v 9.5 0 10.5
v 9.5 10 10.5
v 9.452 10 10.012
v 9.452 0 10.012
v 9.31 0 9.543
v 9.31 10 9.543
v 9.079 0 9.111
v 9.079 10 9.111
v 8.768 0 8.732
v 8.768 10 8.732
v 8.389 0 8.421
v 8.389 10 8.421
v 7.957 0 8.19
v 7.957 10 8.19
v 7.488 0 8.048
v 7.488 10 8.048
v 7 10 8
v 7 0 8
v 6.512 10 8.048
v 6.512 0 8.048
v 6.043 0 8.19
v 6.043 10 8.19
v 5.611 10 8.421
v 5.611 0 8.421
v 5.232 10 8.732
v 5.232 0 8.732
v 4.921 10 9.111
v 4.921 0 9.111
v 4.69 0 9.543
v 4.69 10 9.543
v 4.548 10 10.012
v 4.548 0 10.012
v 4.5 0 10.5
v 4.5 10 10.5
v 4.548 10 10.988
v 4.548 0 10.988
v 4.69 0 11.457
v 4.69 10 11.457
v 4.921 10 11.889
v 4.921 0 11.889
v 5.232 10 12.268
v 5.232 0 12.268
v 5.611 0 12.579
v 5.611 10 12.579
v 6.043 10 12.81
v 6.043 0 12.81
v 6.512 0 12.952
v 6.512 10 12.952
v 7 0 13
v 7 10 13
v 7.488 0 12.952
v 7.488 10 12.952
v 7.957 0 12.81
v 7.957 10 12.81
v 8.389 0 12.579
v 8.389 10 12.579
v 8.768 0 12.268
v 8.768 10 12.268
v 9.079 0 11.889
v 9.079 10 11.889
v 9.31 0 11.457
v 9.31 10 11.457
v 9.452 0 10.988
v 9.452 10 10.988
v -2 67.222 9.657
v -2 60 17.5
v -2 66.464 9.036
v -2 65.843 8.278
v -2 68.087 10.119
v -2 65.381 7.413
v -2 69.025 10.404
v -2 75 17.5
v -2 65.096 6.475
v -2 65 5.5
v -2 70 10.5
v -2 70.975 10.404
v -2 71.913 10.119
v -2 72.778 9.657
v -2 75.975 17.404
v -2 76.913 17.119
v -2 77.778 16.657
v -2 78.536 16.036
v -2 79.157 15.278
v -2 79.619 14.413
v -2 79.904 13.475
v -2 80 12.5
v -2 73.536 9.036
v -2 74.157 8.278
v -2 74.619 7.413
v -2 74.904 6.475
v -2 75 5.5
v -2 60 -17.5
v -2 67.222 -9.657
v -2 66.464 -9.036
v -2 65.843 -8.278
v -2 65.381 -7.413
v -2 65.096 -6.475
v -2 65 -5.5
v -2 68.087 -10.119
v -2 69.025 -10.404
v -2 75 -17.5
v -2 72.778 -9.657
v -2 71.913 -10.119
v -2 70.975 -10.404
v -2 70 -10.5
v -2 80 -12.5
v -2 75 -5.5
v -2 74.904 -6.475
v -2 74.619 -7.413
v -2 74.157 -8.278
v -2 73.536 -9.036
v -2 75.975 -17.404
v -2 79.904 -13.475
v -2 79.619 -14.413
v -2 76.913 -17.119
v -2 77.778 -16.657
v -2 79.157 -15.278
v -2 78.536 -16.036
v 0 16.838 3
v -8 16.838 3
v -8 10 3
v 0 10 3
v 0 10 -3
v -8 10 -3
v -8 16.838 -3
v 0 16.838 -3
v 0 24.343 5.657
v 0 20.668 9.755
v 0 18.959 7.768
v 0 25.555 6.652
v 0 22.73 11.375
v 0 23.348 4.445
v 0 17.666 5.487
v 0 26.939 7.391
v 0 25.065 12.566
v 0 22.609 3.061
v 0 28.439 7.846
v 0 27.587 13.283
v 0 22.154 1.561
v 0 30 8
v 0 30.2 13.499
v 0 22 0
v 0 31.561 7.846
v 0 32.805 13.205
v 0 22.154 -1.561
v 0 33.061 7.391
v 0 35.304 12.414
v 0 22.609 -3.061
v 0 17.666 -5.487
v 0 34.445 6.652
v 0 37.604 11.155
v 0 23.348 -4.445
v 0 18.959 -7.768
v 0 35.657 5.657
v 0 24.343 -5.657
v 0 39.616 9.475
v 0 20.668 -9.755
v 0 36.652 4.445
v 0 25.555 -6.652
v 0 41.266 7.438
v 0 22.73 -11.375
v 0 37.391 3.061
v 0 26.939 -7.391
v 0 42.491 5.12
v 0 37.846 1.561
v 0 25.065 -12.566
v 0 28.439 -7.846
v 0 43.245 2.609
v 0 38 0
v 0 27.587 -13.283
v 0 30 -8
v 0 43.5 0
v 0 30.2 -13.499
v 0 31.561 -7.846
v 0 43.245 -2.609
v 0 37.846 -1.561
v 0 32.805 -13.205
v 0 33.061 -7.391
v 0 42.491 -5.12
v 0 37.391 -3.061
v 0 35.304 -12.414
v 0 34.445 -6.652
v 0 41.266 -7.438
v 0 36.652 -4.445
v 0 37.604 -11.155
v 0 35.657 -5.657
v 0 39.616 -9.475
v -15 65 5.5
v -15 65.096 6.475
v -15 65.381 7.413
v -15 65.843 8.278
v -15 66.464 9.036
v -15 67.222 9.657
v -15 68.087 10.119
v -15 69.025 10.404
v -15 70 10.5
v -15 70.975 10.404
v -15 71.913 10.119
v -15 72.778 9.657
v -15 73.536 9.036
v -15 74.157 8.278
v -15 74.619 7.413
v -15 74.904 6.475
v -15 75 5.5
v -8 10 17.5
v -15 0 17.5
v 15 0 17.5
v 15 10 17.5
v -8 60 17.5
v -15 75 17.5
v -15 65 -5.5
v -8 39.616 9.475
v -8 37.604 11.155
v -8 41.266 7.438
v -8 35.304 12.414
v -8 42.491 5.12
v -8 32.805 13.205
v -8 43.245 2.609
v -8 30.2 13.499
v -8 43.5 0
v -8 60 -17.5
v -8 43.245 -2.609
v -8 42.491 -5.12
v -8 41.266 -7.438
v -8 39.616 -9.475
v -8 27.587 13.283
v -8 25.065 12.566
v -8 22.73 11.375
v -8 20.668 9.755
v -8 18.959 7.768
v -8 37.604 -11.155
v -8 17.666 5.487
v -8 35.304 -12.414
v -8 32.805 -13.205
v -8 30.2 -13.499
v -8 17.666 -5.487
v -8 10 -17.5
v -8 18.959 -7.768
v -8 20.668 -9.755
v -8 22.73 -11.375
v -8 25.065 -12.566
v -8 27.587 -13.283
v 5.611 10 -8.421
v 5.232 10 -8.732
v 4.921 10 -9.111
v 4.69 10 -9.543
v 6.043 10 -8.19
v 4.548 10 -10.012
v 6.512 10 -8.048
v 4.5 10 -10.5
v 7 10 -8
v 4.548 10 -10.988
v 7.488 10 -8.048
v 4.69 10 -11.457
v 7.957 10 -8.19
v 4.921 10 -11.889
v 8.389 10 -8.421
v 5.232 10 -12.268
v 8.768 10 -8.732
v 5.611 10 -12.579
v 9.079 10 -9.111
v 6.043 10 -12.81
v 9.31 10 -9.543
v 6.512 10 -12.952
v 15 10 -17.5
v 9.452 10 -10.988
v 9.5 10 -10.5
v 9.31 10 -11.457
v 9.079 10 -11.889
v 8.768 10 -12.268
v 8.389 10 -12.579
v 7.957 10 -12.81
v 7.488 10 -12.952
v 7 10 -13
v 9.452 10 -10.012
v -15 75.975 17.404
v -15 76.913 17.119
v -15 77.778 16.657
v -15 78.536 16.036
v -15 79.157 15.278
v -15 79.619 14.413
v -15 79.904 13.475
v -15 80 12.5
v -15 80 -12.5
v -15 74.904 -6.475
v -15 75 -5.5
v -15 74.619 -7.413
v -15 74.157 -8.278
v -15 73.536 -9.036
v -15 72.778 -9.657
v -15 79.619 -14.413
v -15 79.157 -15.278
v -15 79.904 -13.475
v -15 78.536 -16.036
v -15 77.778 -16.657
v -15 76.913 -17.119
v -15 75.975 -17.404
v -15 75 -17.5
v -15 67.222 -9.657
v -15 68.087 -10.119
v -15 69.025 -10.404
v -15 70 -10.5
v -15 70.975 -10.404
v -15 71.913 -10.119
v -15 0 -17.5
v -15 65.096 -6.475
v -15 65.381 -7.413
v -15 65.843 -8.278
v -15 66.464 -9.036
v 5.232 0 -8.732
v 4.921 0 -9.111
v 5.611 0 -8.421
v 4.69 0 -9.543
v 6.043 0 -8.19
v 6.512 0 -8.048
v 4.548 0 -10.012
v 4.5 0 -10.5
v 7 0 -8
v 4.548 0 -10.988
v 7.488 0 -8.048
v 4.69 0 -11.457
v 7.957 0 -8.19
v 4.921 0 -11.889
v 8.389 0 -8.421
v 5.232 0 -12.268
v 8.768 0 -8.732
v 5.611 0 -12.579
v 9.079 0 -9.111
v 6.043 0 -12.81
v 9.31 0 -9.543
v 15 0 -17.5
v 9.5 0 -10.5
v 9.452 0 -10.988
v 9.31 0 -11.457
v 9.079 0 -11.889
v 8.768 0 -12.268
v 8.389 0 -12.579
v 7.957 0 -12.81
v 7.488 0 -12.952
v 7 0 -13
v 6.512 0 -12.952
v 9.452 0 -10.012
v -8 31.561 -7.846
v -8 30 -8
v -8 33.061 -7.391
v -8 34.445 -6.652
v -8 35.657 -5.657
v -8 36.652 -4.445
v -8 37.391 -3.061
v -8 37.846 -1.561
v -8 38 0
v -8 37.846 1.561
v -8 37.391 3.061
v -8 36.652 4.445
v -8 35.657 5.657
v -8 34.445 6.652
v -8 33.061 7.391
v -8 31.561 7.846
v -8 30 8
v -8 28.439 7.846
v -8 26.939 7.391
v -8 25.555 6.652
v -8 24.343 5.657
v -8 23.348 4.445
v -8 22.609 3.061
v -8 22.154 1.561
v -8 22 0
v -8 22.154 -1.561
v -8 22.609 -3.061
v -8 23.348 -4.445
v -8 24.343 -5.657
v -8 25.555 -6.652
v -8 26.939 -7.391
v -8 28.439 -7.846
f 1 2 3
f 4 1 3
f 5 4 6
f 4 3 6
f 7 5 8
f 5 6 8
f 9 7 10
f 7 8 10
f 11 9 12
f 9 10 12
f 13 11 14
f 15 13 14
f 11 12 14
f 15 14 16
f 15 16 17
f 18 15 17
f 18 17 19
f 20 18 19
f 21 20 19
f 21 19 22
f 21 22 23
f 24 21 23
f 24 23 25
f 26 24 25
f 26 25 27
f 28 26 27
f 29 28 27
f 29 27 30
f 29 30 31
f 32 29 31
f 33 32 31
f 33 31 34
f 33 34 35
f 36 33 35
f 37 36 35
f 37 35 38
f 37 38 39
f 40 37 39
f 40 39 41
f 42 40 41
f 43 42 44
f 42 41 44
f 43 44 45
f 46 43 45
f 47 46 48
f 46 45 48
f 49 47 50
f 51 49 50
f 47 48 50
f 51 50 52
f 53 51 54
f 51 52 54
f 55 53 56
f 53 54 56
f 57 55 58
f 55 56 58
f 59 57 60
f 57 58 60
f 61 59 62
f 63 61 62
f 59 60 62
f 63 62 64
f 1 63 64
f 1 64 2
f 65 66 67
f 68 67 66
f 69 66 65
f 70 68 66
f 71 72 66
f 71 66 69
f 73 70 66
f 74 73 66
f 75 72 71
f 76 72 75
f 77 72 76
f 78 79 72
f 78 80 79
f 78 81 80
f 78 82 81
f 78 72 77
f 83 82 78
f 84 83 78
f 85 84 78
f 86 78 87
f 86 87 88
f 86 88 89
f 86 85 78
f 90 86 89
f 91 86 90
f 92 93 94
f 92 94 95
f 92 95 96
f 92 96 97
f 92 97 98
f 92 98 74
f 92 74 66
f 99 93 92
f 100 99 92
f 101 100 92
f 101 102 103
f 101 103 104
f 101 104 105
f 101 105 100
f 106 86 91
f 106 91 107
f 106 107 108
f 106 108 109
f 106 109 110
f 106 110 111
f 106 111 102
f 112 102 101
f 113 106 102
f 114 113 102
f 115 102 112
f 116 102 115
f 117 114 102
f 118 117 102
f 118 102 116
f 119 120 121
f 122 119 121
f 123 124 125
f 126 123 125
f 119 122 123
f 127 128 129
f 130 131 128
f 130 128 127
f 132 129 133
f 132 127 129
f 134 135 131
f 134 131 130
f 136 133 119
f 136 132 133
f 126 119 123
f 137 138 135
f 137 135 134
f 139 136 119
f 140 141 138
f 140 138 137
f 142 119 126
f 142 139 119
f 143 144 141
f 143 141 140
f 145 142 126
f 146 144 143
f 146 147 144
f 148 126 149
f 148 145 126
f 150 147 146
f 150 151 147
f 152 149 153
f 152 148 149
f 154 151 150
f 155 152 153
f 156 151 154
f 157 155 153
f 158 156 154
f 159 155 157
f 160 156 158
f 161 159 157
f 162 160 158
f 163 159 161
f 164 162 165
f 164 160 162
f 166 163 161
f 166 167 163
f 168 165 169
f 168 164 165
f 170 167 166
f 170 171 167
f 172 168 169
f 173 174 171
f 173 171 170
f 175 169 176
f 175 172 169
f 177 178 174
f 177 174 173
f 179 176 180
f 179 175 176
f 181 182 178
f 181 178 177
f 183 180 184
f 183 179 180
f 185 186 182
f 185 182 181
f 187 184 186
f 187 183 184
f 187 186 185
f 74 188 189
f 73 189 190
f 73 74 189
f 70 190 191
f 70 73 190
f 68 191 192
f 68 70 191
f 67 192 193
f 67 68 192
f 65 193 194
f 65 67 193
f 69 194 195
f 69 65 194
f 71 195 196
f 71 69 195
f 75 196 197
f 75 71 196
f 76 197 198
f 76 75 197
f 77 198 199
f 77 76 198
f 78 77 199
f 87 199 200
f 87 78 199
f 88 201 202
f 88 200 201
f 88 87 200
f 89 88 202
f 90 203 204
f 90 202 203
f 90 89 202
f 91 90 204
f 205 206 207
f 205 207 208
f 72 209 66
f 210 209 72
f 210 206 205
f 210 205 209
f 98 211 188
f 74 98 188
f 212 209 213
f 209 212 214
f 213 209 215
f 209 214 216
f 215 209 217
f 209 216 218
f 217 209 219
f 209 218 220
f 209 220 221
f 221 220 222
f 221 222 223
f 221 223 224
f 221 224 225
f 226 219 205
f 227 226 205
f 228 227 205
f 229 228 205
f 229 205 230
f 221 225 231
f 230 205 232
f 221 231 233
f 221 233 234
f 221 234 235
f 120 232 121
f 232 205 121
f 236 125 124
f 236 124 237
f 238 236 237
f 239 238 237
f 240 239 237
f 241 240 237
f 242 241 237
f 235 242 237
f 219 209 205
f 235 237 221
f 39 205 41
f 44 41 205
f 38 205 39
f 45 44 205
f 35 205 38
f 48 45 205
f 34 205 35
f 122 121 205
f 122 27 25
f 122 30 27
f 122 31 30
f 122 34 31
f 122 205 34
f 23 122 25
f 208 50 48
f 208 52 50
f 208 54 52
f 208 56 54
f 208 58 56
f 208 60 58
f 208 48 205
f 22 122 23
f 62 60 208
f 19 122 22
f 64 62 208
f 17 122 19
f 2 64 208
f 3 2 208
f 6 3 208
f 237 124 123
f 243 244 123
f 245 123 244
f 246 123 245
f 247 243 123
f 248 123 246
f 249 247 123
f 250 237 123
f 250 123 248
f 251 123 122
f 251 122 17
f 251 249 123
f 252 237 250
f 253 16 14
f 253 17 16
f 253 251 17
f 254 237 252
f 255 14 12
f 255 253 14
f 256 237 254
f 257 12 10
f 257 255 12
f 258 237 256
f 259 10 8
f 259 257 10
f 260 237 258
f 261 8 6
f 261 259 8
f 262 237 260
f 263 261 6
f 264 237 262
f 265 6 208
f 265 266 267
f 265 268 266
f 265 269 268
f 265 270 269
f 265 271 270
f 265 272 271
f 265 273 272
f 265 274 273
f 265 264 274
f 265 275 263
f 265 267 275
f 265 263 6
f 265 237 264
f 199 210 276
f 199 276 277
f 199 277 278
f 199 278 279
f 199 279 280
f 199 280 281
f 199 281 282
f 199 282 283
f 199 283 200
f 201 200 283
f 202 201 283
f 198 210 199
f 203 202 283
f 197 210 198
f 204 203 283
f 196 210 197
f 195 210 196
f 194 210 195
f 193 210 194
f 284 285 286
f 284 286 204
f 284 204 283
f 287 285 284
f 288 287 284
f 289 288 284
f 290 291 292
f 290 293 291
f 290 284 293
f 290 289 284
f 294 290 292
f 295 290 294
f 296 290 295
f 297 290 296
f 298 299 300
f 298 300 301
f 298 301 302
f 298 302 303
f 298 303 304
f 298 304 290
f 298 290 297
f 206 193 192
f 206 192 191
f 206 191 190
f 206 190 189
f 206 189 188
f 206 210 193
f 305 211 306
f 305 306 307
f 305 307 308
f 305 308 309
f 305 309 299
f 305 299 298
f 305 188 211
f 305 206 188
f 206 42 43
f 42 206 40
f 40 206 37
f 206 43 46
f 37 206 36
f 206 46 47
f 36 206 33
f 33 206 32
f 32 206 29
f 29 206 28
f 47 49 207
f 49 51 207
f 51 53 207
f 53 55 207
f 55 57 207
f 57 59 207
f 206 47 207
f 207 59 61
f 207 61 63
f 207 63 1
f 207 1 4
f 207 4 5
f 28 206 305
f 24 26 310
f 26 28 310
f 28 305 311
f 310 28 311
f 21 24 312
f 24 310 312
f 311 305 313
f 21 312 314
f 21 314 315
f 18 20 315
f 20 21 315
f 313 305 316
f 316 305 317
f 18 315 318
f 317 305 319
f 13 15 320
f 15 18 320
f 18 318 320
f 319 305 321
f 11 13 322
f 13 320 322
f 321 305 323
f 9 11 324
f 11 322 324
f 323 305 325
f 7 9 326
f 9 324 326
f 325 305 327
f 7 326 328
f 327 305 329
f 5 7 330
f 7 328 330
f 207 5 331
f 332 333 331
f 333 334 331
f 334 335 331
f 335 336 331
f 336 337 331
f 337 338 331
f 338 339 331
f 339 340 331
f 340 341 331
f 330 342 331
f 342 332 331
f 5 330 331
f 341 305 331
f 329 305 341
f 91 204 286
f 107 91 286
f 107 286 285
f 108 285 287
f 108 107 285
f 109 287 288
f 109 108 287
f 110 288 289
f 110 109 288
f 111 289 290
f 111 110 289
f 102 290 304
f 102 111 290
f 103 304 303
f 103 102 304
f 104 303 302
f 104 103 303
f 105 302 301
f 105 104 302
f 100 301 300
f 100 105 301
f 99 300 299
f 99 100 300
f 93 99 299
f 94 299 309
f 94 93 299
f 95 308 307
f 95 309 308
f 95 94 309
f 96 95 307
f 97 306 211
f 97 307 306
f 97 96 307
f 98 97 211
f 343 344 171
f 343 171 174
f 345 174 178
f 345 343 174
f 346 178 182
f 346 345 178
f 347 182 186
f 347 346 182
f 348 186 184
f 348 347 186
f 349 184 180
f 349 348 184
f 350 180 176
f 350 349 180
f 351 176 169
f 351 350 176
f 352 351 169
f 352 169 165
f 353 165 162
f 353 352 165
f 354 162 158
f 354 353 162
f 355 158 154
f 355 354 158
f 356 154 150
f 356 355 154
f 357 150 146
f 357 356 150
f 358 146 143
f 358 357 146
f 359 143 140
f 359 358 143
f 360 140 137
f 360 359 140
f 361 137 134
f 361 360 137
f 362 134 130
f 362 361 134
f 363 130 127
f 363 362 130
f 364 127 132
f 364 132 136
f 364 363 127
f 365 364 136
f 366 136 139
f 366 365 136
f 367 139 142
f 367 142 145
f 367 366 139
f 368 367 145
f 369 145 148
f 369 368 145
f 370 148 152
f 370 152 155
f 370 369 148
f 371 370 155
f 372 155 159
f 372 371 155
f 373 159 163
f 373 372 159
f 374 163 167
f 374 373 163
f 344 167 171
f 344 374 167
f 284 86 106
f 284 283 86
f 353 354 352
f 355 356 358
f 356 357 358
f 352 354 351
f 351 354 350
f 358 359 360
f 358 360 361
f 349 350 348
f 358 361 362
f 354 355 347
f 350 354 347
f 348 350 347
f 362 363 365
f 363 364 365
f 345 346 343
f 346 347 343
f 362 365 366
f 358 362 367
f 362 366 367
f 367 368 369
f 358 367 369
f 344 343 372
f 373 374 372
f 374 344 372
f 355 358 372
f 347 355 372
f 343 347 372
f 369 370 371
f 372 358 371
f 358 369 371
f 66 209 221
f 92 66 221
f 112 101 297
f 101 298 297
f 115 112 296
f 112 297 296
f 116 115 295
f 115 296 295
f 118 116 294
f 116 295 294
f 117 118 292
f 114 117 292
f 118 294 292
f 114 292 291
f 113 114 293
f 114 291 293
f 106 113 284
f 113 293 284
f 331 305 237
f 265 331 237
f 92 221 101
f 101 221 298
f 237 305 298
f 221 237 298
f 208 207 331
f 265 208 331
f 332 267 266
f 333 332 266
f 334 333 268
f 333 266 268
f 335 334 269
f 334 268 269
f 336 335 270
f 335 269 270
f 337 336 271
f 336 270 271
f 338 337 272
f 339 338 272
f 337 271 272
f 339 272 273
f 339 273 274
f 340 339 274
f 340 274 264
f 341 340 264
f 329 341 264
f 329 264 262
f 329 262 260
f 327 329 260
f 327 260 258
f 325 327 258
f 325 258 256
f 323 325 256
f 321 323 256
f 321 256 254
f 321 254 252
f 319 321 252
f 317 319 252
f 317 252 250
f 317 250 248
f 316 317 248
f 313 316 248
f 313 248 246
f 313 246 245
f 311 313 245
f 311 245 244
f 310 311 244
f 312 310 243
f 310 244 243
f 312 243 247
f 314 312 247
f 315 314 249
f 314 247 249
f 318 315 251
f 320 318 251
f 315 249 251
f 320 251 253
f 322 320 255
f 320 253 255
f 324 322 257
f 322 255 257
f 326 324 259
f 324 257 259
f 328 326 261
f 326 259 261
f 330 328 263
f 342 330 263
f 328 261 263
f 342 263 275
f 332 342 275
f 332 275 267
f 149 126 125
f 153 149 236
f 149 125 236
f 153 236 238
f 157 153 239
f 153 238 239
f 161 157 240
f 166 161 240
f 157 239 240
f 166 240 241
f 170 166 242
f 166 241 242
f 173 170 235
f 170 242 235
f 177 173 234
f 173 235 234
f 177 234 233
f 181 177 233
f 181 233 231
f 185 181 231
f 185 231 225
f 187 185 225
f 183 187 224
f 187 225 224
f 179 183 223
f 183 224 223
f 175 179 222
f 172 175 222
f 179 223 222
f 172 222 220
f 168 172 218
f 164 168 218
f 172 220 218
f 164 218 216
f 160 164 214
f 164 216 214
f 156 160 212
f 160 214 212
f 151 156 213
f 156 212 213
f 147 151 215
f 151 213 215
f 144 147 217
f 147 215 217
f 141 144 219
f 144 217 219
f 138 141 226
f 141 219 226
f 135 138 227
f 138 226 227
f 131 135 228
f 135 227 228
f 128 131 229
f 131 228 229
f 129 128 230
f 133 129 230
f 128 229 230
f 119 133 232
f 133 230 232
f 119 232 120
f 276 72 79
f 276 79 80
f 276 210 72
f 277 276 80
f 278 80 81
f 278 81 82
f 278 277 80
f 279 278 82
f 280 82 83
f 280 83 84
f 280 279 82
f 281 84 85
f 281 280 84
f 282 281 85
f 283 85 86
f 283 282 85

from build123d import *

# Parameters (mm, degrees)
IZIM1_W                     = 30
IZIM1_H                     = 35
Y_KSEKLIK_EKSTR_ZYON1_DEPTH = 10
IZIM2_W                     = 7
IZIM2_H                     = 35
Y_KSEKLIK_EKSTR_ZYON2_DEPTH = 70
IZIM3_W                     = 35
IZIM3_H                     = 20
Y_KSEKLIK_EKSTR_ZYON3_DEPTH = 6
RADYUS1_R                   = 5
KES_EKSTR_ZYON1_DEPTH       = 14
IZIM5_R                     = 2.5
KES_EKSTR_ZYON2_DEPTH       = 11
IZIM6_R                     = 8
Y_KSEKLIK_EKSTR_ZYON4_DEPTH = 8


with BuildPart() as part:
    # Çizim1 → Yükseklik-Ekstrüzyon1 (new body)
    with BuildSketch(Plane(origin=(0, 0, 0), x_dir=(1, 0, 0), z_dir=(0, 1, 0))):
        Rectangle(IZIM1_W, IZIM1_H)
    extrude(amount=Y_KSEKLIK_EKSTR_ZYON1_DEPTH)

    # Çizim2 → Yükseklik-Ekstrüzyon2 (add)
    with BuildSketch(Plane(origin=(0, 10, 0), x_dir=(1, 0, 0), z_dir=(0, 1, 0))):
        with Locations((-11.5, 0)):
            Rectangle(IZIM2_W, IZIM2_H)
    extrude(amount=Y_KSEKLIK_EKSTR_ZYON2_DEPTH)

    # Çizim3 → Yükseklik-Ekstrüzyon3 (add)
    with BuildSketch(Plane(origin=(-8, 0, 0), x_dir=(0, 0, -1), z_dir=(1, 0, 0))):
        with Locations((0, 70)):
            Rectangle(IZIM3_W, IZIM3_H)
    extrude(amount=Y_KSEKLIK_EKSTR_ZYON3_DEPTH)

    # Radyus1
    radyus1_edges = [part.edges().sort_by_distance(p)[0] for p in [
        (-8.5, 80, 17.5),
        (-8.5, 80, -17.5),
    ]]
    fillet(radyus1_edges, radius=RADYUS1_R)

    # Çizim4 → Kes-Ekstrüzyon1 (cut, through all)
    with BuildSketch(Plane(origin=(-2, 0, 0), x_dir=(0, 0, -1), z_dir=(1, 0, 0))):
        with BuildLine():
            Line((-5.5, 75), (5.5, 75))
            ThreePointArc((5.5, 75), (10.5, 70), (5.5, 65))
            Line((5.5, 65), (-5.5, 65))
            ThreePointArc((-5.5, 65), (-10.5, 70), (-5.5, 75))
        make_face()
    extrude(amount=-KES_EKSTR_ZYON1_DEPTH, mode=Mode.SUBTRACT)

    # Çizim5 → Kes-Ekstrüzyon2 (cut, through all)
    with BuildSketch(Plane(origin=(0, 10, 0), x_dir=(1, 0, 0), z_dir=(0, 1, 0))):
        with Locations((7, 10.5)):
            Circle(IZIM5_R)
        with Locations((7, -10.5)):
            Circle(IZIM5_R)
    extrude(amount=-KES_EKSTR_ZYON2_DEPTH, mode=Mode.SUBTRACT)

    # Çizim6 → Yükseklik-Ekstrüzyon4 (add)
    with BuildSketch(Plane(origin=(-8, 0, 0), x_dir=(0, 0, -1), z_dir=(1, 0, 0))):
        with BuildLine():
            Line((-3, 10), (3, 10))
            Line((3, 10), (3, 16.837553419))
            ThreePointArc((3, 16.837553419), (0, 43.5), (-3, 16.837553419))
            Line((-3, 16.837553419), (-3, 10))
        make_face()
        with Locations((0, 30)):
            Circle(IZIM6_R, mode=Mode.SUBTRACT)
    extrude(amount=Y_KSEKLIK_EKSTR_ZYON4_DEPTH)


solid = part.part
